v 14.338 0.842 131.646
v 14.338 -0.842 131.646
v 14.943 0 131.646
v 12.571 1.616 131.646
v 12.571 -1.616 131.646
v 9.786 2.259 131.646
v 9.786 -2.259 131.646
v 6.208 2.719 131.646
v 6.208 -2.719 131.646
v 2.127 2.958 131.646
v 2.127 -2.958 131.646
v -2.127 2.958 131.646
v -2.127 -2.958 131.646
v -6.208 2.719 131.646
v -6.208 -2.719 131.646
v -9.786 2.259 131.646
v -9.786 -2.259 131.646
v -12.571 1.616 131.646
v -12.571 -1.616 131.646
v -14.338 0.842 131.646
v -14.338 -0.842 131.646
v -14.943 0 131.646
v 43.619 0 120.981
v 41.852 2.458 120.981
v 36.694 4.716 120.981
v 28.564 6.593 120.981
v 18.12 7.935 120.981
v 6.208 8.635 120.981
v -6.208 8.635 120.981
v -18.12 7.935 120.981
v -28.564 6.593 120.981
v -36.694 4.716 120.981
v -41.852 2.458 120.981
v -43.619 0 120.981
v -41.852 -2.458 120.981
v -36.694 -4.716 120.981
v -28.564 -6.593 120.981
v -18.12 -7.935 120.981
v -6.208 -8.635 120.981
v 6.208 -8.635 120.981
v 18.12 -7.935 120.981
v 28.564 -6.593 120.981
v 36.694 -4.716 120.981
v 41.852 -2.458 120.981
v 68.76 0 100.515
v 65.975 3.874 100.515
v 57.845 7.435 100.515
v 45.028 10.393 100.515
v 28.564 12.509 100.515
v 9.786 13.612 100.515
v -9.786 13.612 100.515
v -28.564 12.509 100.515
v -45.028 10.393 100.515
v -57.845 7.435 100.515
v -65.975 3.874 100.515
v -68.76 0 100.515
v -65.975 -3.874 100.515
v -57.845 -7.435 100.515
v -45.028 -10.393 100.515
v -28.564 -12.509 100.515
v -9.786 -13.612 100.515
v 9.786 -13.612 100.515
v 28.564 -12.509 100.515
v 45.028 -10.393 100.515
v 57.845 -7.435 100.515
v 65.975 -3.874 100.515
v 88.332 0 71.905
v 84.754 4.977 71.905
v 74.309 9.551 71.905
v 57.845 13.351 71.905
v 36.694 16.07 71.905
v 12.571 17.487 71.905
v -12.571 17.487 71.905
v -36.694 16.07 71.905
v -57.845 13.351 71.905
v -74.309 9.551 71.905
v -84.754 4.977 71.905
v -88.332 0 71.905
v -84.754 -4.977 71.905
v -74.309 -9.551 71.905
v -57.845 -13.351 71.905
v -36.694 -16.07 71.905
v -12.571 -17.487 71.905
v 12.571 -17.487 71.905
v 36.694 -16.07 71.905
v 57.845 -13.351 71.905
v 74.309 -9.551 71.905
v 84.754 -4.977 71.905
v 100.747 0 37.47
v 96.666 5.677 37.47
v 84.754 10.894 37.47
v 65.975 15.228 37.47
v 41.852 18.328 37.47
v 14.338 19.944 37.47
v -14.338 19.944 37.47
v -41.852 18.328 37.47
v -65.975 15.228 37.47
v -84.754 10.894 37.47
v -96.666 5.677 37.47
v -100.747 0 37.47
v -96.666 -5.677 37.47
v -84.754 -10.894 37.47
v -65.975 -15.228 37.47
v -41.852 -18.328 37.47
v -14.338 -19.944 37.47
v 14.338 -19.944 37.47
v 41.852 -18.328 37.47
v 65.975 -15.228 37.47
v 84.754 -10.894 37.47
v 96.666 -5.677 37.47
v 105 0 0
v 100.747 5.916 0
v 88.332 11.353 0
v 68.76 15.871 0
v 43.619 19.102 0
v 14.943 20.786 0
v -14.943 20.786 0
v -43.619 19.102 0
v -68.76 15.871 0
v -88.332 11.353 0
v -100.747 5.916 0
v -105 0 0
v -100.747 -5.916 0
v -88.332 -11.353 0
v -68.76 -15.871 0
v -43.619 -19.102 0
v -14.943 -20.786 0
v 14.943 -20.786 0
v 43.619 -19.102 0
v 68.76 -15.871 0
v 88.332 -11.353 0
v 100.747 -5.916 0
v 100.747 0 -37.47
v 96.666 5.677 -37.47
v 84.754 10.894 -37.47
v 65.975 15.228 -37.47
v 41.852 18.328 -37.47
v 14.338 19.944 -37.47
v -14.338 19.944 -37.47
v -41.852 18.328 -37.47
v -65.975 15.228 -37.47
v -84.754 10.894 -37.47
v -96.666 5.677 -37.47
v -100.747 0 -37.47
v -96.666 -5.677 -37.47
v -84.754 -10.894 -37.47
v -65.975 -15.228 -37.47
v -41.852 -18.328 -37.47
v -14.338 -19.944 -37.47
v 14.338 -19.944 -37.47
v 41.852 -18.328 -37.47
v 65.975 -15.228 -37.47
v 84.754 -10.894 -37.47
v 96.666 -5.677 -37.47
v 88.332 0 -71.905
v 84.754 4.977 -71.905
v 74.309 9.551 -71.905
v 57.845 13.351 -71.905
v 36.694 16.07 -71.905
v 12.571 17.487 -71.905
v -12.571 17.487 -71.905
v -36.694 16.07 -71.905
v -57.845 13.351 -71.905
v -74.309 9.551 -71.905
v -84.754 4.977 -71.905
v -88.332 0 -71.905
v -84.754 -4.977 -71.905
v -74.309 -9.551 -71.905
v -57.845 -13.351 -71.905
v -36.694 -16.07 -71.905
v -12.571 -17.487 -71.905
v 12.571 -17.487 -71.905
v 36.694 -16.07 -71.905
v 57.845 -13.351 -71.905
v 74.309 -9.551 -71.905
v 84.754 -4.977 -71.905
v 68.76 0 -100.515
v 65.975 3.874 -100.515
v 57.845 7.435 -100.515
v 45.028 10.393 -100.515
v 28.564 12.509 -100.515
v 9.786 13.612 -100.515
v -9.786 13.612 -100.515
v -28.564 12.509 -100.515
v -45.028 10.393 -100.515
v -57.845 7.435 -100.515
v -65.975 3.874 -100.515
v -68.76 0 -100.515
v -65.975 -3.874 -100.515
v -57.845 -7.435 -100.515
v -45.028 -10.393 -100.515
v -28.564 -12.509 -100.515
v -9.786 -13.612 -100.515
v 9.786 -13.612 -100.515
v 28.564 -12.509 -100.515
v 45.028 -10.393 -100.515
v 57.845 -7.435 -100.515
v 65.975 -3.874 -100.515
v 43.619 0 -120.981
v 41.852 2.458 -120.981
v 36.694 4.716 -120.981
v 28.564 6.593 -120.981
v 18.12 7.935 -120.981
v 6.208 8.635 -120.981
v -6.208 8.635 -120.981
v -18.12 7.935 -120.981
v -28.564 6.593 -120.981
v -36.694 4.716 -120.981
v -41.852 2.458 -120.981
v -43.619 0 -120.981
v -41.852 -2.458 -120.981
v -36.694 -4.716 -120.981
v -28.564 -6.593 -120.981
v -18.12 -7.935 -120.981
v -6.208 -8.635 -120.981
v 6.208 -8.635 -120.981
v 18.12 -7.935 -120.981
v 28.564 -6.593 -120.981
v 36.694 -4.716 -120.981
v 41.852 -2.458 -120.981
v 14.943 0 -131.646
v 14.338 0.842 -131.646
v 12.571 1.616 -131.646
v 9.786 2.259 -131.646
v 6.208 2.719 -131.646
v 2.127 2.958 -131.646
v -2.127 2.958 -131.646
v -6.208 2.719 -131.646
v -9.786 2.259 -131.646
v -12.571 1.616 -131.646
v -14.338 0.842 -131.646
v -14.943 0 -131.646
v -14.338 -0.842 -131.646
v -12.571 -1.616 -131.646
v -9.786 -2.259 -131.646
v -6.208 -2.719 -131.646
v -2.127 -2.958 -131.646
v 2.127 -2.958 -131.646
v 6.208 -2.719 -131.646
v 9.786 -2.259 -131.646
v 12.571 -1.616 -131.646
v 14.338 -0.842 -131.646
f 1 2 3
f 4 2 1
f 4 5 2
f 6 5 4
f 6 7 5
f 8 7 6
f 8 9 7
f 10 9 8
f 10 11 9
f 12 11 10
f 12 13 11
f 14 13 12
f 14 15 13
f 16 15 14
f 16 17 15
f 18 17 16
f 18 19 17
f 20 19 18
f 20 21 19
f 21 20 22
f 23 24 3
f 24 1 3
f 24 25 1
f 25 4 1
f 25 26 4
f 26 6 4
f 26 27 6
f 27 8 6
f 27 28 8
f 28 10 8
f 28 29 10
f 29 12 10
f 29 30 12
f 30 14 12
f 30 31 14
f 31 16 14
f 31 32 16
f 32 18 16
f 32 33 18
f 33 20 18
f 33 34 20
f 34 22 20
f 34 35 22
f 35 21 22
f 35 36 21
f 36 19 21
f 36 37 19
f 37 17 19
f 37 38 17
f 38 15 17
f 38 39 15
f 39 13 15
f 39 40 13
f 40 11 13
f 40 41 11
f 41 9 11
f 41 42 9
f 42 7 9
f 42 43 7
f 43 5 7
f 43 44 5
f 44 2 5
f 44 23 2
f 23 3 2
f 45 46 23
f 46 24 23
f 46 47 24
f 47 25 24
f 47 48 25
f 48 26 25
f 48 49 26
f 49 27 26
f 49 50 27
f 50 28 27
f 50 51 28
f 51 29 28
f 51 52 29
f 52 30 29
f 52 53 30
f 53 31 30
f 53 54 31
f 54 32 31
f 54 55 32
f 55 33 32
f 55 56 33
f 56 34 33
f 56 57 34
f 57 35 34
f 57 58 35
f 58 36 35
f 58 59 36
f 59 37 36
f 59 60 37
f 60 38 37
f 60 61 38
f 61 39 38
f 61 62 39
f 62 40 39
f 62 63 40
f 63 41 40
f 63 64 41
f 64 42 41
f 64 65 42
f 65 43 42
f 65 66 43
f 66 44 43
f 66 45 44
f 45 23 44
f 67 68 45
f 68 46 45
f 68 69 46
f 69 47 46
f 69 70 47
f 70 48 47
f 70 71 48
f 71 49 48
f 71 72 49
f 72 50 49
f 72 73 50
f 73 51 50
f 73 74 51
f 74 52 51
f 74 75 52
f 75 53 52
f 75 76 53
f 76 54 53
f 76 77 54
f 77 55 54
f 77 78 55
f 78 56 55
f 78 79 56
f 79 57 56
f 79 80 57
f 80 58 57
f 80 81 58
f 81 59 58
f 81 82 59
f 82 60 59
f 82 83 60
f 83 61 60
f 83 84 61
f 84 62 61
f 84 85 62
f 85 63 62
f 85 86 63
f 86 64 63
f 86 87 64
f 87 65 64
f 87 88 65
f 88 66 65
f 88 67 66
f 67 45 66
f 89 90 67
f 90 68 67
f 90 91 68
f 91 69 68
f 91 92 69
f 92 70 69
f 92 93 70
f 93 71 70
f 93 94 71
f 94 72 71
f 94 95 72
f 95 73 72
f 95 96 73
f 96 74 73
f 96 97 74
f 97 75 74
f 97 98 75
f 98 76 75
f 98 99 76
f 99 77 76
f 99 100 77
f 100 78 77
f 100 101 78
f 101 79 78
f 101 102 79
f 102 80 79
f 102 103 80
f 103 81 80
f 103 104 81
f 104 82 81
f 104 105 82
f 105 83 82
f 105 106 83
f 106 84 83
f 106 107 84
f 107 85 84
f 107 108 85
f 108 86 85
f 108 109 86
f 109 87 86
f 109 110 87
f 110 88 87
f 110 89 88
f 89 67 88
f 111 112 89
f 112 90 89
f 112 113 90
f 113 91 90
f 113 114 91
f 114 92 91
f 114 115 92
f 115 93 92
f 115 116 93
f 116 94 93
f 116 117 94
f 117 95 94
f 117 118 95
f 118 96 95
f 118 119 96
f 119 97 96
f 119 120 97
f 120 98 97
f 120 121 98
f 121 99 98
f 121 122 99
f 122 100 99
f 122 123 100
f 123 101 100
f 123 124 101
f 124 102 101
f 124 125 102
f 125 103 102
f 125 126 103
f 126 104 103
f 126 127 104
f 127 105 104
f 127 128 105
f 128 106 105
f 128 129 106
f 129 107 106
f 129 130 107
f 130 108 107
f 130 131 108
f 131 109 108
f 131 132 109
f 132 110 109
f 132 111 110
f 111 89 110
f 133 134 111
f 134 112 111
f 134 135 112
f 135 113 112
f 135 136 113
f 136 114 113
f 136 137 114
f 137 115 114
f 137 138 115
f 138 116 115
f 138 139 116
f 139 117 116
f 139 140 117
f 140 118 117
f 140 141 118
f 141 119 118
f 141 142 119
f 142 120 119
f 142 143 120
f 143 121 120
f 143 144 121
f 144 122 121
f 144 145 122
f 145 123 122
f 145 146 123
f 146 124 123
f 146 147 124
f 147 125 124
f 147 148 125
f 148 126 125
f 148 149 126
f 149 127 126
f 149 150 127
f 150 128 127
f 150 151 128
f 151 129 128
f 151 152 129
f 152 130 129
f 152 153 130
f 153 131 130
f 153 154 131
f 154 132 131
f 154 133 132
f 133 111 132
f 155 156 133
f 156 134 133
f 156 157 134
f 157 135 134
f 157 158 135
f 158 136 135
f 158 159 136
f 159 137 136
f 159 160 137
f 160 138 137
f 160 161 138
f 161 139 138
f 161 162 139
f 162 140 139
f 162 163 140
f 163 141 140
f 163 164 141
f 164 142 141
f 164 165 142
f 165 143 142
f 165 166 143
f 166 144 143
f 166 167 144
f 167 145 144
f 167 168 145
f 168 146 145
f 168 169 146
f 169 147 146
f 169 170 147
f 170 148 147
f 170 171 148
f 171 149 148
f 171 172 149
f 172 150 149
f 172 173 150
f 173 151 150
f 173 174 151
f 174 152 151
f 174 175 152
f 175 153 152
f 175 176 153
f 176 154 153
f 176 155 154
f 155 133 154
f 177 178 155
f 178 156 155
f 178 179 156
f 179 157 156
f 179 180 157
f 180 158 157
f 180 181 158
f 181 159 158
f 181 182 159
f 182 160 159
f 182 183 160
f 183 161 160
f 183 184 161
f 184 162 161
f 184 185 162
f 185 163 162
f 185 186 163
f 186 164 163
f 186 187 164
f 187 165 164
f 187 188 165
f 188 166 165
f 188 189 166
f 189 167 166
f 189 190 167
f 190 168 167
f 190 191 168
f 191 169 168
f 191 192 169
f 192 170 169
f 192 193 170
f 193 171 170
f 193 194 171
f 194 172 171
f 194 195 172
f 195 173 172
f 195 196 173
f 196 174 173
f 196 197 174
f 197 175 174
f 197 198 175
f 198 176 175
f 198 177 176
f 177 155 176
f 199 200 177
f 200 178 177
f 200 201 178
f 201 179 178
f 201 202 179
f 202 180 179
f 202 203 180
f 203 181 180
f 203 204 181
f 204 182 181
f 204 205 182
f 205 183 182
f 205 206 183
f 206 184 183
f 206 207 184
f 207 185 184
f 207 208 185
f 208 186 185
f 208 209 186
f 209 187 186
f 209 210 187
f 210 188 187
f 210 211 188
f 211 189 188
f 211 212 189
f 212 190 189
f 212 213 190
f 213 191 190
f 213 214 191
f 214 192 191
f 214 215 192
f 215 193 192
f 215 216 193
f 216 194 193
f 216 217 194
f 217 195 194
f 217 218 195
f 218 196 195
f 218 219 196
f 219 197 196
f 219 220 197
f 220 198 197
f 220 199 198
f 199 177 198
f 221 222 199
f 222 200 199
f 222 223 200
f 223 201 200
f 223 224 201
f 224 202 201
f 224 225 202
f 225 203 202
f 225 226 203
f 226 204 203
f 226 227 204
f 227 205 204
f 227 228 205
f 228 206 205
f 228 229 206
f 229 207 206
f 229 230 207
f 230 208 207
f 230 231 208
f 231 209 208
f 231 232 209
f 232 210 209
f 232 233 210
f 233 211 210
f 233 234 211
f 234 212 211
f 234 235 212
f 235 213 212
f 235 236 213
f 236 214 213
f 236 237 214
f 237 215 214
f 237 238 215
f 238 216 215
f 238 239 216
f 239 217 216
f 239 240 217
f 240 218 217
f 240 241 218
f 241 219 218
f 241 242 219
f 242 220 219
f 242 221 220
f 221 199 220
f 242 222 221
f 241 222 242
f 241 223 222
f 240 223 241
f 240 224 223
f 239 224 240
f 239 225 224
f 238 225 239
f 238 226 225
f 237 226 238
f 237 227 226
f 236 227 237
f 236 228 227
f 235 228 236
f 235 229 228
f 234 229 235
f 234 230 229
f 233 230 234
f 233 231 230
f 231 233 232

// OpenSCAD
// Generated by SolidPython 1.0.1 on 2020-07-29 00:46:51


scale(v = [15, 3, 19]) {
	sphere(r = 7);
}
/***********************************************
*********      SolidPython code:      **********
************************************************
 
# import packages: SolidPython
from solid import *
from solid.utils import *
from itertools import chain, combinations, permutations


class Resize:

    def __init__(self, scad_file):
        self.scad_file = scad_file
        #self.scad_file = import_scad(scad_file)
        # cone/cylinder param:
        self.r1 = 0
        self.r2 = 0
        self.h = 0
        # rectangular prism param:
        self.w = 0
        self.l = 0
        # ellipse param:
        self.r = 0

    # import OpenScad code (file name corresponds to shape)


    # classify shape + parameters
    def assign(self, param1, param2, param3):
        if self.scad_file == 'cone.scad':
            self.r1 = param1
            self.r2 = param2
            self.h = param3
        elif self.scad_file == 'cylinder.scad':
            self.r1 = param1
            self.r2 = param2
            self.h = param3
        elif self.scad_file == 'rectangularPrism.scad':
            self.h = param1
            self.l = param2
            self.w = param3
        else:
            self.r = param1
            self.h = param2

    # resize parameters
    def iterate(self):
        x = range(3, 20, 2)
        i = 1
        if self.scad_file == 'cone.scad':
            tempList = list(permutations(x, 2))
            for temp in tempList:
                param1 = temp[0]
                param2 = temp[1]
                filepath = 'produced_scad_files/' + 'cone' + str(param1) + '_' + str(param2) + '_' + '.scad'
                scad_render_to_file(cylinder(h=param1, r1=param2, r2=0), filepath)

        elif self.scad_file == 'cylinder.scad':
            tempList = list(permutations(x, 3))
            for temp in tempList:
                param1 = temp[0]
                param2 = temp[1]
                filepath = 'produced_scad_files/' + 'cylinder' + str(param1) + '_' + str(param2) + '_' + '.scad'
                scad_render_to_file(cylinder(h=param1, r1=param2, r2=param2), filepath)

        elif self.scad_file == 'rectangularPrism.scad':
            tempList = list(permutations(x, 3))
            for temp in tempList:
                param1 = temp[0]
                param2 = temp[1]
                param3 = temp[2]
                filepath = 'produced_scad_files/' + 'rectangularPrism' + str(param1) + '_' + str(param2) + '_' + str(
                    param3) + '.scad'
                scad_render_to_file(cube(size=(param1, param2, param3)), filepath)

        elif self.scad_file == 'ellipse.scad':
            tempList = list(permutations(x, 4))
            for temp in tempList:
                param1 = temp[0]
                param2 = temp[1]
                param3 = temp[2]
                param4 = temp[3]
                filepath = 'produced_scad_files/' + 'ellipse' + str(param1) + '_' + str(param2) + '_' + str(param3) + '_' + str(param4) + '.scad'
                scad_render_to_file(scale([param1, param2, param3])(sphere(r=param4)), filepath)

    def render_to_scadfile(self):
        scad_render_to_file(scad, 'example.scad') 
 
************************************************/
